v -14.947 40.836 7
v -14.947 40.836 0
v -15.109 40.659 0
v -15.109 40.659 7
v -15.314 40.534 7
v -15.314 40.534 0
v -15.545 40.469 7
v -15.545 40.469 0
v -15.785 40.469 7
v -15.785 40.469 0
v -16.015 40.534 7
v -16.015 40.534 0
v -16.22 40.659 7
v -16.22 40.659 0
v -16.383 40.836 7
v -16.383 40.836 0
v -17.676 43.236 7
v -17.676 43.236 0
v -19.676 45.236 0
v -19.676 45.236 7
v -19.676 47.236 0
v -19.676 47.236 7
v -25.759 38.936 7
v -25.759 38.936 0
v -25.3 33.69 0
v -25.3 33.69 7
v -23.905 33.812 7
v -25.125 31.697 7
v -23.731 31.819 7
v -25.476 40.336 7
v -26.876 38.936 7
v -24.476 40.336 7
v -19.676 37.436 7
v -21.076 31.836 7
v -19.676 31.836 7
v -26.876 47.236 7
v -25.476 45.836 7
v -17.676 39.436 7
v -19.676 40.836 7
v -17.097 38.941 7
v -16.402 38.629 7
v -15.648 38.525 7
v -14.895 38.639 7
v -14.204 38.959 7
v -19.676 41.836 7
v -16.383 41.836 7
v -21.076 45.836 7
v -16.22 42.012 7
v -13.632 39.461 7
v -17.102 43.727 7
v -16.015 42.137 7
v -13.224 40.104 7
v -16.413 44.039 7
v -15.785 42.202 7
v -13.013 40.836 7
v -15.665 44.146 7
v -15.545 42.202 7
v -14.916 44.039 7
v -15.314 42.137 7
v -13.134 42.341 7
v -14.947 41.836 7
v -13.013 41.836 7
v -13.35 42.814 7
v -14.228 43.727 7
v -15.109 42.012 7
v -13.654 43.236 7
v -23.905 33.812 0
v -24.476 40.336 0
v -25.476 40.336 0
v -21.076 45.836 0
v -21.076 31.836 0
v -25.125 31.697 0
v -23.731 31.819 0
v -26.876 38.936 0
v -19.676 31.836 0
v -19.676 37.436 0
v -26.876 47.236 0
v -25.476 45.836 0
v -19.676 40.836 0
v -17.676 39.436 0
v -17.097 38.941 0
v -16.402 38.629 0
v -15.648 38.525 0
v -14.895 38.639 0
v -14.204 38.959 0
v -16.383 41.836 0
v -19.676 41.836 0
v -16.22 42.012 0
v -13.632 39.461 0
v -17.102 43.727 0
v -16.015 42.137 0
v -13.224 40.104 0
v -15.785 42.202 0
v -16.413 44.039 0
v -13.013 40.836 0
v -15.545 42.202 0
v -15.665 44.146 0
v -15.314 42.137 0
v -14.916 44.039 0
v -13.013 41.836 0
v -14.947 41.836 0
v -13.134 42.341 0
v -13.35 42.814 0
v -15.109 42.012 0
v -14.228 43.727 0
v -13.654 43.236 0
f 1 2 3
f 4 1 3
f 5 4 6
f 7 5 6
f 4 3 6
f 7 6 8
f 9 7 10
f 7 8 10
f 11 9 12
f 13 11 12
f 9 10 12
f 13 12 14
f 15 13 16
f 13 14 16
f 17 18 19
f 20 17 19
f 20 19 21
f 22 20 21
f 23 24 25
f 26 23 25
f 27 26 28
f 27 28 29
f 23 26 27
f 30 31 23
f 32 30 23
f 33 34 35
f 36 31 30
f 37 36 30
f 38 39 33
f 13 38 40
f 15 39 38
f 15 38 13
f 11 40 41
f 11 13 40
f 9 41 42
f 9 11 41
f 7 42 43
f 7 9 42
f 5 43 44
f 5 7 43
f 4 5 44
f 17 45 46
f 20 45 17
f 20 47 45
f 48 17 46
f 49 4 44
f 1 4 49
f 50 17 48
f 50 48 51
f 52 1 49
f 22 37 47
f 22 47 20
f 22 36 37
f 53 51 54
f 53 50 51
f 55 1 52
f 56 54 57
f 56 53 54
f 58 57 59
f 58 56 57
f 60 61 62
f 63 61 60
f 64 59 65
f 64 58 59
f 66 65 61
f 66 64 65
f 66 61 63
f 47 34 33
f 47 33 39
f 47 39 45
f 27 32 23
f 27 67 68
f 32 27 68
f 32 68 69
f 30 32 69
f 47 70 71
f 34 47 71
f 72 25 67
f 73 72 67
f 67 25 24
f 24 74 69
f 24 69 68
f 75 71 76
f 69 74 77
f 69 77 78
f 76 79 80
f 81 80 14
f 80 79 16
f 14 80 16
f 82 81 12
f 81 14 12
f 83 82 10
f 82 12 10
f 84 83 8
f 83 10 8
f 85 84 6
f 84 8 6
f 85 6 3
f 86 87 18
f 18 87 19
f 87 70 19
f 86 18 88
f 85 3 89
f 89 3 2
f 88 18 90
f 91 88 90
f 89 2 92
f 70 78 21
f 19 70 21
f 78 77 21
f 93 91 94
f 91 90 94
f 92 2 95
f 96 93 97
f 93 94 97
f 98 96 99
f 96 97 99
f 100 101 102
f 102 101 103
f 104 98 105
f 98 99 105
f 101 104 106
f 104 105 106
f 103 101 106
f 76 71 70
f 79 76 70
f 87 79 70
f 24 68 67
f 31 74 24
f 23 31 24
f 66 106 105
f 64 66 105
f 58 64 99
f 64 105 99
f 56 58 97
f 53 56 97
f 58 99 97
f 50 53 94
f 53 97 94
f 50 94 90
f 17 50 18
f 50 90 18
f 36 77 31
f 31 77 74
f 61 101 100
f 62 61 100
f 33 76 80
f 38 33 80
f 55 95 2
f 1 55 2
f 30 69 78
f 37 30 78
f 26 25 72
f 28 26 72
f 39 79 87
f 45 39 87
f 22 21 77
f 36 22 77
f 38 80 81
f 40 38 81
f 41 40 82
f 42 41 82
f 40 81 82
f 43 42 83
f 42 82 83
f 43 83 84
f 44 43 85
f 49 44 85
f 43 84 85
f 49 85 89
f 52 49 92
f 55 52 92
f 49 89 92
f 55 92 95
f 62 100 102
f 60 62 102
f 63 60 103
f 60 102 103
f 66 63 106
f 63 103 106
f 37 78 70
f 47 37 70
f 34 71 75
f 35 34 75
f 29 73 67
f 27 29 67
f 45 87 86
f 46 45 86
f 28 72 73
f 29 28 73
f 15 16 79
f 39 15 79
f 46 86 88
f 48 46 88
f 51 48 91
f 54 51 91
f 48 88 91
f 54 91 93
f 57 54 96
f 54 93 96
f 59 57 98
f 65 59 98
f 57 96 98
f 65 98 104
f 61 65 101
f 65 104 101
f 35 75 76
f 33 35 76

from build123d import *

# Parameters (mm, degrees)
F1_DEPTH = 7


with BuildPart() as f1:
    # F0 (on Top) → F1 (new body)
    with BuildSketch(Plane.XY):
        with BuildLine():
            Line((-25.475699, 40.335676), (-25.475699, 45.835676))
            Line((-25.475699, 45.835676), (-21.075699, 45.835676))
            Line((-21.075699, 45.835676), (-21.075699, 33.835676))
            Line((-21.075699, 33.835676), (-21.075699, 31.835676))
            Line((-21.075699, 31.835676), (-19.6757, 31.835676))
            Line((-19.6757, 31.835676), (-19.6757, 33.835676))
            Line((-19.6757, 33.835676), (-19.6757, 37.435679))
            Line((-19.6757, 37.435679), (-17.6757, 39.435679))
            ThreePointArc((-17.6757, 39.435679), (-14.89494, 38.638502), (-13.013308, 40.835677))
            Line((-13.013308, 40.835677), (-14.946623, 40.835677))
            ThreePointArc((-14.946623, 40.835677), (-15.664693, 40.460677), (-16.382763, 40.835677))
            Line((-16.382763, 40.835677), (-19.6757, 40.835677))
            Line((-19.6757, 40.835677), (-19.6757, 41.835677))
            Line((-19.6757, 41.835677), (-16.382763, 41.835677))
            ThreePointArc((-16.382763, 41.835677), (-15.664693, 42.210677), (-14.946623, 41.835677))
            Line((-14.946623, 41.835677), (-13.013308, 41.835677))
            ThreePointArc((-13.013308, 41.835677), (-13.230669, 42.582711), (-13.653686, 43.235675))
            ThreePointArc((-13.653686, 43.235675), (-15.664693, 44.145927), (-17.6757, 43.235675))
            Line((-17.6757, 43.235675), (-19.6757, 45.235675))
            Line((-19.6757, 45.235675), (-19.6757, 47.235675))
            Line((-19.6757, 47.235675), (-26.875699, 47.235675))
            Line((-26.875699, 47.235675), (-26.875699, 38.935676))
            Line((-26.875699, 38.935676), (-25.758563, 38.935676))
            Line((-25.758563, 38.935676), (-25.299585, 33.689533))
            Line((-25.299585, 33.689533), (-25.125273, 31.697143))
            Line((-25.125273, 31.697143), (-23.730601, 31.819161))
            Line((-23.730601, 31.819161), (-23.904913, 33.811551))
            Line((-23.904913, 33.811551), (-24.475699, 40.335676))
            Line((-24.475699, 40.335676), (-25.475699, 40.335676))
        make_face()
    extrude(amount=F1_DEPTH)


solid = f1.part
